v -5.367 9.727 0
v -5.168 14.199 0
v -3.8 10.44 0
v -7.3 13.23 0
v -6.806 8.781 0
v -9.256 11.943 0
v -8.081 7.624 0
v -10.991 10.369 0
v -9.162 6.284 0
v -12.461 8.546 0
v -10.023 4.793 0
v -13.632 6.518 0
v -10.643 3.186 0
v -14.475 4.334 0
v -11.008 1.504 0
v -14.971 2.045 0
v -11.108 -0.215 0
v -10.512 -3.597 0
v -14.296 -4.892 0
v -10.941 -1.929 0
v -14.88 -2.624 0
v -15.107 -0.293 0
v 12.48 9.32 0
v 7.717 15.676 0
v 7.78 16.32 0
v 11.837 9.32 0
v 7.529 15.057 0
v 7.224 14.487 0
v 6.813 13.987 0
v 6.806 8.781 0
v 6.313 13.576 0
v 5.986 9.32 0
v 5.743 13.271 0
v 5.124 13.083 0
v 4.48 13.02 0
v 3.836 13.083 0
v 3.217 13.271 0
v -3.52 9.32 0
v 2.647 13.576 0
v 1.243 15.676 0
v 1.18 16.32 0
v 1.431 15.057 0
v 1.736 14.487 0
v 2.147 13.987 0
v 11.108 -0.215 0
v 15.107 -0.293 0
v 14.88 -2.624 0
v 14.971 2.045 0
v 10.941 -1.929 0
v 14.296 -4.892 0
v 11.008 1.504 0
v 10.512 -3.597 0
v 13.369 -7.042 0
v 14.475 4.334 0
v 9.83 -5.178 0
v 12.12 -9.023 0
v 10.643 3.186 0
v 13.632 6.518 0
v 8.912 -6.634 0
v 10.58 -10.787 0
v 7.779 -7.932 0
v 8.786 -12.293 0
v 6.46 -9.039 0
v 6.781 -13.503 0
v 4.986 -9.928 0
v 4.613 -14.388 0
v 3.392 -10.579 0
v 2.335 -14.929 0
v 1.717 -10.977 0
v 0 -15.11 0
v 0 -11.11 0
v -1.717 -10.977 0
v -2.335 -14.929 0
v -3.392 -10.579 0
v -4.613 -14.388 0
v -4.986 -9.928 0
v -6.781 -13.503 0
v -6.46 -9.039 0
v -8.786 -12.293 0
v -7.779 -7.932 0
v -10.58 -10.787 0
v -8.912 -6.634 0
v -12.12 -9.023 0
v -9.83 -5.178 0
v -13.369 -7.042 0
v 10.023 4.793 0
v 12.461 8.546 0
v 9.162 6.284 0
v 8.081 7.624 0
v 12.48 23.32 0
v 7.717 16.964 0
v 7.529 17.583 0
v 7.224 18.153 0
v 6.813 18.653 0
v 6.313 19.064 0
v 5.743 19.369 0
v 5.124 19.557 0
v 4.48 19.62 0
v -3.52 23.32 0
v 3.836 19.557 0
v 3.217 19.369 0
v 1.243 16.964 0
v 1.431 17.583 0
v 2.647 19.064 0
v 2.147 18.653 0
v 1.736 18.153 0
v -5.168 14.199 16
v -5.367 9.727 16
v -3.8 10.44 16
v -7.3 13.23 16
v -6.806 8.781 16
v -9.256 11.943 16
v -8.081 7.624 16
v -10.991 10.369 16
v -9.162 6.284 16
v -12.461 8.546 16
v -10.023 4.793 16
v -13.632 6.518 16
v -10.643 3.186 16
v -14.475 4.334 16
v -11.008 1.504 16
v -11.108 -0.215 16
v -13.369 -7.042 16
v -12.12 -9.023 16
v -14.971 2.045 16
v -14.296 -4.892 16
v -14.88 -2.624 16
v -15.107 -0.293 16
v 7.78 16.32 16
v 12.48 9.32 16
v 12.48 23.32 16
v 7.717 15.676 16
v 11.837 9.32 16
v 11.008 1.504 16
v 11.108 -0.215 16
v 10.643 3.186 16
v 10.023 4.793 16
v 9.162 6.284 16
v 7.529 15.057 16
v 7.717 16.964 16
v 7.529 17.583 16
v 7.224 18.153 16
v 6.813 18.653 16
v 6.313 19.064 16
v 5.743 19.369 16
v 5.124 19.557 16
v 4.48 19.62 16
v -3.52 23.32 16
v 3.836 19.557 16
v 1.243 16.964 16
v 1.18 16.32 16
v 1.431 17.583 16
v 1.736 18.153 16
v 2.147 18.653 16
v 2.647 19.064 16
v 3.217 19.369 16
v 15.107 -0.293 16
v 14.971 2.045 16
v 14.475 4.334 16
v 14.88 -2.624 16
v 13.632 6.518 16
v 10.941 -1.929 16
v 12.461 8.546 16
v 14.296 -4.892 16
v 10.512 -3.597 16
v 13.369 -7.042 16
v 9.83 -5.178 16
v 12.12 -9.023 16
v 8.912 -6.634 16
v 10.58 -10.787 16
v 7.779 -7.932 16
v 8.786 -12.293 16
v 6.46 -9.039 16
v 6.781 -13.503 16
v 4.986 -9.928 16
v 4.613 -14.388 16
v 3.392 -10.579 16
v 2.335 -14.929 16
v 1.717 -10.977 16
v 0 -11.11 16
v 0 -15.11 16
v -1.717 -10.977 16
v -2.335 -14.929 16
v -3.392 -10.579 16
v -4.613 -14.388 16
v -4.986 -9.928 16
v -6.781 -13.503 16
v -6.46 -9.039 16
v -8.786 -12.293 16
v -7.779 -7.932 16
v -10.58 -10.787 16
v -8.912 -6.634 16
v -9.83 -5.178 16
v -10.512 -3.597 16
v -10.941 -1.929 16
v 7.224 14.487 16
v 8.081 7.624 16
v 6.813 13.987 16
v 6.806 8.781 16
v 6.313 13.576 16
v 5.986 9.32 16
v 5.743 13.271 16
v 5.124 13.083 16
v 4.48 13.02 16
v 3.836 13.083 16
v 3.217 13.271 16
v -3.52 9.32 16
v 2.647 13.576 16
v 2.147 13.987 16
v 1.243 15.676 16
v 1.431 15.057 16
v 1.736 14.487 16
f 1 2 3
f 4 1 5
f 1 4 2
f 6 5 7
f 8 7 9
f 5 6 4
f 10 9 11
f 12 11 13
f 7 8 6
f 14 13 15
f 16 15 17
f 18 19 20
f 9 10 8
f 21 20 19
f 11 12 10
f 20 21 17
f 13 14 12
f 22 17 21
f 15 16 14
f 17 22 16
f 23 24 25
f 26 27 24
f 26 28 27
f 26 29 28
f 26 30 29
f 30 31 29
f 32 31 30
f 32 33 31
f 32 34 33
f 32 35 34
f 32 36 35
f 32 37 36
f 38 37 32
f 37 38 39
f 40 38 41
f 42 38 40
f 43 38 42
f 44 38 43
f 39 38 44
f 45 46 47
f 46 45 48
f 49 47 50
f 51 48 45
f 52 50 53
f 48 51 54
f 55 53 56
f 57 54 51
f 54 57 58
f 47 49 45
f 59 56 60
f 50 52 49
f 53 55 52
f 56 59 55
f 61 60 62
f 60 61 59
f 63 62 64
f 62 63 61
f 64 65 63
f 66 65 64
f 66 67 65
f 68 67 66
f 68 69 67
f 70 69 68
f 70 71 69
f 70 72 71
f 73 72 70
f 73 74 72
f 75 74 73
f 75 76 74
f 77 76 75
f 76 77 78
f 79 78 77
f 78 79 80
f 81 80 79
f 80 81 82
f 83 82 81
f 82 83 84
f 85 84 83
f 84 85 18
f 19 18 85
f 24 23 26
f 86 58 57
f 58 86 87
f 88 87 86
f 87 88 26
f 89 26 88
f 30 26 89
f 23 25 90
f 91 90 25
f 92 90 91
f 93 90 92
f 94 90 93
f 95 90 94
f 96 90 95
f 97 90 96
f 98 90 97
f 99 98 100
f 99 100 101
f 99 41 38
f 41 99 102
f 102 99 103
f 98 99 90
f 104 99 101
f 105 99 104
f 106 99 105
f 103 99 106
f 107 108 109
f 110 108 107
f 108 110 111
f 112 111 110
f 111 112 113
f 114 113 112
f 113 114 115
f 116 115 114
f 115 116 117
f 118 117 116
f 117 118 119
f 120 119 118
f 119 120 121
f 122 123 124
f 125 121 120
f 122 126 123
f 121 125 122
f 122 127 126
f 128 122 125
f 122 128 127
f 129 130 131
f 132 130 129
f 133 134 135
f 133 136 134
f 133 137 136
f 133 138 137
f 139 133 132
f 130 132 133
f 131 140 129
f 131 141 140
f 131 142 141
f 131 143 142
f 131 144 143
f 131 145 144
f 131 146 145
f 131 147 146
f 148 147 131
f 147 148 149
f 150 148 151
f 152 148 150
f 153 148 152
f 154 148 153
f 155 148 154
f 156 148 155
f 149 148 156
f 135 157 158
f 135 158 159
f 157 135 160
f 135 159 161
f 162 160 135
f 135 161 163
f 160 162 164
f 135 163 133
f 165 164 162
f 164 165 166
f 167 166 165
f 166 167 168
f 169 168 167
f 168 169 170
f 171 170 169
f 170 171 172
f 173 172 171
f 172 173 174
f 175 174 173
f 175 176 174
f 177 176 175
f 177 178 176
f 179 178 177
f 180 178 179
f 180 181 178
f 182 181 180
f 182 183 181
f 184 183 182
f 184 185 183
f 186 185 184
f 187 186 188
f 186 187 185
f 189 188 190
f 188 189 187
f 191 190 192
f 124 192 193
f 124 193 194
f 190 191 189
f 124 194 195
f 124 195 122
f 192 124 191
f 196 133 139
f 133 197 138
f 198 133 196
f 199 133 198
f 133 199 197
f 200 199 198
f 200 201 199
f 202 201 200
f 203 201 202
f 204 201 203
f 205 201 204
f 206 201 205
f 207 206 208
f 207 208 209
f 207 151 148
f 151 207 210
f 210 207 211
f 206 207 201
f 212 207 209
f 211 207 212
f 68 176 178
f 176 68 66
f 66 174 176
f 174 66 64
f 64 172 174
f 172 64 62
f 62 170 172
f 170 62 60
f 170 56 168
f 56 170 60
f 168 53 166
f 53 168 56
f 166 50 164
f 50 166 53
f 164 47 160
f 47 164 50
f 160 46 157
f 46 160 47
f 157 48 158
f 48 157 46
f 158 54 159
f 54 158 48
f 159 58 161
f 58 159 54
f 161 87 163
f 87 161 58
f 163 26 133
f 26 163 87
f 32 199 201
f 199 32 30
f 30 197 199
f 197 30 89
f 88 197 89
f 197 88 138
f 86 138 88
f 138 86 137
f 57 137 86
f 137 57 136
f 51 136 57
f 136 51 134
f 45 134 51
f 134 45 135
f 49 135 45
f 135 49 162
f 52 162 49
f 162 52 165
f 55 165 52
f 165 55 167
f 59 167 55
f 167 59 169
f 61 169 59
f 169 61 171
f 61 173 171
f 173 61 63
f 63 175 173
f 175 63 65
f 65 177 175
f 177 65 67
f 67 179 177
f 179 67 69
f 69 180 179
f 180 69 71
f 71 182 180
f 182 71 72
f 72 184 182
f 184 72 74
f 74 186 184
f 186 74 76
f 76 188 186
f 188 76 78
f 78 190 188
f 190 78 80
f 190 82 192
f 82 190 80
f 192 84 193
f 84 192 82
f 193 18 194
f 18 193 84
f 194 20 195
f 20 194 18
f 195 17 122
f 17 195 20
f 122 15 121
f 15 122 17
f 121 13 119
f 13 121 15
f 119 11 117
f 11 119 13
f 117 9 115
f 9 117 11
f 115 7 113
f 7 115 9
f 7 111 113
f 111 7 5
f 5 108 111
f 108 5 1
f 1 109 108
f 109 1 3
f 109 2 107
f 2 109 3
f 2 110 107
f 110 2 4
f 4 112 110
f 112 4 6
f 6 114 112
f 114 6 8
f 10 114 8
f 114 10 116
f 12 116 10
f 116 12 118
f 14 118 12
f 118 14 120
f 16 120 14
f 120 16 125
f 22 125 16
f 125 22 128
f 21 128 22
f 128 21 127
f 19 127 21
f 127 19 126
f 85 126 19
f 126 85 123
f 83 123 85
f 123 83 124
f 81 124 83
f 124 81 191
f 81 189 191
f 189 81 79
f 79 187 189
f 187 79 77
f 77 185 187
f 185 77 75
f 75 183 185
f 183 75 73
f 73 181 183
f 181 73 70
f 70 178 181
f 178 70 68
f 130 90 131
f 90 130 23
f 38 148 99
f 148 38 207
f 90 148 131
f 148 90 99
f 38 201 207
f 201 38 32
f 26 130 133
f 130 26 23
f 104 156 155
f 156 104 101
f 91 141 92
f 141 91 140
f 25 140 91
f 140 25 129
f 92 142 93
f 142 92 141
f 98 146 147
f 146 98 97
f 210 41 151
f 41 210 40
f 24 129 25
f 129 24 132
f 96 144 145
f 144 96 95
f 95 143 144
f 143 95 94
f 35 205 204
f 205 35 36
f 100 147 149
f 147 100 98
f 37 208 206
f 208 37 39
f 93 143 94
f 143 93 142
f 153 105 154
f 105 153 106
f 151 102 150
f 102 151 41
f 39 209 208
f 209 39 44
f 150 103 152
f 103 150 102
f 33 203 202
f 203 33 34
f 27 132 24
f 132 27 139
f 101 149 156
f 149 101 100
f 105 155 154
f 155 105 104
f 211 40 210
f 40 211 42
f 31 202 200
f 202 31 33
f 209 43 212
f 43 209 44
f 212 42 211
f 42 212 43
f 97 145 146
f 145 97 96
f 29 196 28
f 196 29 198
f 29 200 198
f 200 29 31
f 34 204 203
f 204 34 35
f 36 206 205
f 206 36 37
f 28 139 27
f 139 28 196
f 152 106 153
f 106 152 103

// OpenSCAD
$fn = 32;

// ----------------------------------------------------------------------
// Pipe clamp: 30.22 mm ring, 4 mm wall, 16 mm wide
// ----------------------------------------------------------------------

// --- parameters (mm) ---
outer_r = 15.11;          // clamp outside radius
inner_r = 11.11;          // pipe bore radius
band = 4;                 // band thickness
clamp_w = 16;             // clamp width
opening = 40;             // opening angle between the ends
lug_w = 16;               // lug width
lug_len = 14;             // lug length
bolt_d = 6.6;             // bolt hole

clamp_profile = [[-5.168, 14.199], [-7.3, 13.23], [-9.256, 11.943], [-10.991, 10.369], [-12.461, 8.546], [-13.632, 6.518], [-14.475, 4.334], [-14.971, 2.045], [-15.107, -0.293], [-14.88, -2.624], [-14.296, -4.892], [-13.369, -7.042], [-12.12, -9.023], [-10.58, -10.787], [-8.786, -12.293], [-6.781, -13.503], [-4.613, -14.388], [-2.335, -14.929], [0, -15.11], [2.335, -14.929], [4.613, -14.388], [6.781, -13.503], [8.786, -12.293], [10.58, -10.787], [12.12, -9.023], [13.369, -7.042], [14.296, -4.892], [14.88, -2.624], [15.107, -0.293], [14.971, 2.045], [14.475, 4.334], [13.632, 6.518], [12.461, 8.546], [10.991, 10.369], [9.256, 11.943], [7.3, 13.23], [5.168, 14.199], [3.8, 10.44], [5.367, 9.727], [6.806, 8.781], [8.081, 7.624], [9.162, 6.284], [10.023, 4.793], [10.643, 3.186], [11.008, 1.504], [11.108, -0.215], [10.941, -1.929], [10.512, -3.597], [9.83, -5.178], [8.912, -6.634], [7.779, -7.932], [6.46, -9.039], [4.986, -9.928], [3.392, -10.579], [1.717, -10.977], [0, -11.11], [-1.717, -10.977], [-3.392, -10.579], [-4.986, -9.928], [-6.46, -9.039], [-7.779, -7.932], [-8.912, -6.634], [-9.83, -5.178], [-10.512, -3.597], [-10.941, -1.929], [-11.108, -0.215], [-11.008, 1.504], [-10.643, 3.186], [-10.023, 4.793], [-9.162, 6.284], [-8.081, 7.624], [-6.806, 8.781], [-5.367, 9.727], [-3.8, 10.44]];

difference() {
  union() {
    linear_extrude(height = clamp_w) polygon(clamp_profile);
    /* bolt lug on the other end */
    translate([-3.52, 9.32, 0]) cube([lug_w, 14, clamp_w]);
  }
  translate([4.48, 16.32, -2.5]) cylinder(h = clamp_w + 5, d = bolt_d);
}
